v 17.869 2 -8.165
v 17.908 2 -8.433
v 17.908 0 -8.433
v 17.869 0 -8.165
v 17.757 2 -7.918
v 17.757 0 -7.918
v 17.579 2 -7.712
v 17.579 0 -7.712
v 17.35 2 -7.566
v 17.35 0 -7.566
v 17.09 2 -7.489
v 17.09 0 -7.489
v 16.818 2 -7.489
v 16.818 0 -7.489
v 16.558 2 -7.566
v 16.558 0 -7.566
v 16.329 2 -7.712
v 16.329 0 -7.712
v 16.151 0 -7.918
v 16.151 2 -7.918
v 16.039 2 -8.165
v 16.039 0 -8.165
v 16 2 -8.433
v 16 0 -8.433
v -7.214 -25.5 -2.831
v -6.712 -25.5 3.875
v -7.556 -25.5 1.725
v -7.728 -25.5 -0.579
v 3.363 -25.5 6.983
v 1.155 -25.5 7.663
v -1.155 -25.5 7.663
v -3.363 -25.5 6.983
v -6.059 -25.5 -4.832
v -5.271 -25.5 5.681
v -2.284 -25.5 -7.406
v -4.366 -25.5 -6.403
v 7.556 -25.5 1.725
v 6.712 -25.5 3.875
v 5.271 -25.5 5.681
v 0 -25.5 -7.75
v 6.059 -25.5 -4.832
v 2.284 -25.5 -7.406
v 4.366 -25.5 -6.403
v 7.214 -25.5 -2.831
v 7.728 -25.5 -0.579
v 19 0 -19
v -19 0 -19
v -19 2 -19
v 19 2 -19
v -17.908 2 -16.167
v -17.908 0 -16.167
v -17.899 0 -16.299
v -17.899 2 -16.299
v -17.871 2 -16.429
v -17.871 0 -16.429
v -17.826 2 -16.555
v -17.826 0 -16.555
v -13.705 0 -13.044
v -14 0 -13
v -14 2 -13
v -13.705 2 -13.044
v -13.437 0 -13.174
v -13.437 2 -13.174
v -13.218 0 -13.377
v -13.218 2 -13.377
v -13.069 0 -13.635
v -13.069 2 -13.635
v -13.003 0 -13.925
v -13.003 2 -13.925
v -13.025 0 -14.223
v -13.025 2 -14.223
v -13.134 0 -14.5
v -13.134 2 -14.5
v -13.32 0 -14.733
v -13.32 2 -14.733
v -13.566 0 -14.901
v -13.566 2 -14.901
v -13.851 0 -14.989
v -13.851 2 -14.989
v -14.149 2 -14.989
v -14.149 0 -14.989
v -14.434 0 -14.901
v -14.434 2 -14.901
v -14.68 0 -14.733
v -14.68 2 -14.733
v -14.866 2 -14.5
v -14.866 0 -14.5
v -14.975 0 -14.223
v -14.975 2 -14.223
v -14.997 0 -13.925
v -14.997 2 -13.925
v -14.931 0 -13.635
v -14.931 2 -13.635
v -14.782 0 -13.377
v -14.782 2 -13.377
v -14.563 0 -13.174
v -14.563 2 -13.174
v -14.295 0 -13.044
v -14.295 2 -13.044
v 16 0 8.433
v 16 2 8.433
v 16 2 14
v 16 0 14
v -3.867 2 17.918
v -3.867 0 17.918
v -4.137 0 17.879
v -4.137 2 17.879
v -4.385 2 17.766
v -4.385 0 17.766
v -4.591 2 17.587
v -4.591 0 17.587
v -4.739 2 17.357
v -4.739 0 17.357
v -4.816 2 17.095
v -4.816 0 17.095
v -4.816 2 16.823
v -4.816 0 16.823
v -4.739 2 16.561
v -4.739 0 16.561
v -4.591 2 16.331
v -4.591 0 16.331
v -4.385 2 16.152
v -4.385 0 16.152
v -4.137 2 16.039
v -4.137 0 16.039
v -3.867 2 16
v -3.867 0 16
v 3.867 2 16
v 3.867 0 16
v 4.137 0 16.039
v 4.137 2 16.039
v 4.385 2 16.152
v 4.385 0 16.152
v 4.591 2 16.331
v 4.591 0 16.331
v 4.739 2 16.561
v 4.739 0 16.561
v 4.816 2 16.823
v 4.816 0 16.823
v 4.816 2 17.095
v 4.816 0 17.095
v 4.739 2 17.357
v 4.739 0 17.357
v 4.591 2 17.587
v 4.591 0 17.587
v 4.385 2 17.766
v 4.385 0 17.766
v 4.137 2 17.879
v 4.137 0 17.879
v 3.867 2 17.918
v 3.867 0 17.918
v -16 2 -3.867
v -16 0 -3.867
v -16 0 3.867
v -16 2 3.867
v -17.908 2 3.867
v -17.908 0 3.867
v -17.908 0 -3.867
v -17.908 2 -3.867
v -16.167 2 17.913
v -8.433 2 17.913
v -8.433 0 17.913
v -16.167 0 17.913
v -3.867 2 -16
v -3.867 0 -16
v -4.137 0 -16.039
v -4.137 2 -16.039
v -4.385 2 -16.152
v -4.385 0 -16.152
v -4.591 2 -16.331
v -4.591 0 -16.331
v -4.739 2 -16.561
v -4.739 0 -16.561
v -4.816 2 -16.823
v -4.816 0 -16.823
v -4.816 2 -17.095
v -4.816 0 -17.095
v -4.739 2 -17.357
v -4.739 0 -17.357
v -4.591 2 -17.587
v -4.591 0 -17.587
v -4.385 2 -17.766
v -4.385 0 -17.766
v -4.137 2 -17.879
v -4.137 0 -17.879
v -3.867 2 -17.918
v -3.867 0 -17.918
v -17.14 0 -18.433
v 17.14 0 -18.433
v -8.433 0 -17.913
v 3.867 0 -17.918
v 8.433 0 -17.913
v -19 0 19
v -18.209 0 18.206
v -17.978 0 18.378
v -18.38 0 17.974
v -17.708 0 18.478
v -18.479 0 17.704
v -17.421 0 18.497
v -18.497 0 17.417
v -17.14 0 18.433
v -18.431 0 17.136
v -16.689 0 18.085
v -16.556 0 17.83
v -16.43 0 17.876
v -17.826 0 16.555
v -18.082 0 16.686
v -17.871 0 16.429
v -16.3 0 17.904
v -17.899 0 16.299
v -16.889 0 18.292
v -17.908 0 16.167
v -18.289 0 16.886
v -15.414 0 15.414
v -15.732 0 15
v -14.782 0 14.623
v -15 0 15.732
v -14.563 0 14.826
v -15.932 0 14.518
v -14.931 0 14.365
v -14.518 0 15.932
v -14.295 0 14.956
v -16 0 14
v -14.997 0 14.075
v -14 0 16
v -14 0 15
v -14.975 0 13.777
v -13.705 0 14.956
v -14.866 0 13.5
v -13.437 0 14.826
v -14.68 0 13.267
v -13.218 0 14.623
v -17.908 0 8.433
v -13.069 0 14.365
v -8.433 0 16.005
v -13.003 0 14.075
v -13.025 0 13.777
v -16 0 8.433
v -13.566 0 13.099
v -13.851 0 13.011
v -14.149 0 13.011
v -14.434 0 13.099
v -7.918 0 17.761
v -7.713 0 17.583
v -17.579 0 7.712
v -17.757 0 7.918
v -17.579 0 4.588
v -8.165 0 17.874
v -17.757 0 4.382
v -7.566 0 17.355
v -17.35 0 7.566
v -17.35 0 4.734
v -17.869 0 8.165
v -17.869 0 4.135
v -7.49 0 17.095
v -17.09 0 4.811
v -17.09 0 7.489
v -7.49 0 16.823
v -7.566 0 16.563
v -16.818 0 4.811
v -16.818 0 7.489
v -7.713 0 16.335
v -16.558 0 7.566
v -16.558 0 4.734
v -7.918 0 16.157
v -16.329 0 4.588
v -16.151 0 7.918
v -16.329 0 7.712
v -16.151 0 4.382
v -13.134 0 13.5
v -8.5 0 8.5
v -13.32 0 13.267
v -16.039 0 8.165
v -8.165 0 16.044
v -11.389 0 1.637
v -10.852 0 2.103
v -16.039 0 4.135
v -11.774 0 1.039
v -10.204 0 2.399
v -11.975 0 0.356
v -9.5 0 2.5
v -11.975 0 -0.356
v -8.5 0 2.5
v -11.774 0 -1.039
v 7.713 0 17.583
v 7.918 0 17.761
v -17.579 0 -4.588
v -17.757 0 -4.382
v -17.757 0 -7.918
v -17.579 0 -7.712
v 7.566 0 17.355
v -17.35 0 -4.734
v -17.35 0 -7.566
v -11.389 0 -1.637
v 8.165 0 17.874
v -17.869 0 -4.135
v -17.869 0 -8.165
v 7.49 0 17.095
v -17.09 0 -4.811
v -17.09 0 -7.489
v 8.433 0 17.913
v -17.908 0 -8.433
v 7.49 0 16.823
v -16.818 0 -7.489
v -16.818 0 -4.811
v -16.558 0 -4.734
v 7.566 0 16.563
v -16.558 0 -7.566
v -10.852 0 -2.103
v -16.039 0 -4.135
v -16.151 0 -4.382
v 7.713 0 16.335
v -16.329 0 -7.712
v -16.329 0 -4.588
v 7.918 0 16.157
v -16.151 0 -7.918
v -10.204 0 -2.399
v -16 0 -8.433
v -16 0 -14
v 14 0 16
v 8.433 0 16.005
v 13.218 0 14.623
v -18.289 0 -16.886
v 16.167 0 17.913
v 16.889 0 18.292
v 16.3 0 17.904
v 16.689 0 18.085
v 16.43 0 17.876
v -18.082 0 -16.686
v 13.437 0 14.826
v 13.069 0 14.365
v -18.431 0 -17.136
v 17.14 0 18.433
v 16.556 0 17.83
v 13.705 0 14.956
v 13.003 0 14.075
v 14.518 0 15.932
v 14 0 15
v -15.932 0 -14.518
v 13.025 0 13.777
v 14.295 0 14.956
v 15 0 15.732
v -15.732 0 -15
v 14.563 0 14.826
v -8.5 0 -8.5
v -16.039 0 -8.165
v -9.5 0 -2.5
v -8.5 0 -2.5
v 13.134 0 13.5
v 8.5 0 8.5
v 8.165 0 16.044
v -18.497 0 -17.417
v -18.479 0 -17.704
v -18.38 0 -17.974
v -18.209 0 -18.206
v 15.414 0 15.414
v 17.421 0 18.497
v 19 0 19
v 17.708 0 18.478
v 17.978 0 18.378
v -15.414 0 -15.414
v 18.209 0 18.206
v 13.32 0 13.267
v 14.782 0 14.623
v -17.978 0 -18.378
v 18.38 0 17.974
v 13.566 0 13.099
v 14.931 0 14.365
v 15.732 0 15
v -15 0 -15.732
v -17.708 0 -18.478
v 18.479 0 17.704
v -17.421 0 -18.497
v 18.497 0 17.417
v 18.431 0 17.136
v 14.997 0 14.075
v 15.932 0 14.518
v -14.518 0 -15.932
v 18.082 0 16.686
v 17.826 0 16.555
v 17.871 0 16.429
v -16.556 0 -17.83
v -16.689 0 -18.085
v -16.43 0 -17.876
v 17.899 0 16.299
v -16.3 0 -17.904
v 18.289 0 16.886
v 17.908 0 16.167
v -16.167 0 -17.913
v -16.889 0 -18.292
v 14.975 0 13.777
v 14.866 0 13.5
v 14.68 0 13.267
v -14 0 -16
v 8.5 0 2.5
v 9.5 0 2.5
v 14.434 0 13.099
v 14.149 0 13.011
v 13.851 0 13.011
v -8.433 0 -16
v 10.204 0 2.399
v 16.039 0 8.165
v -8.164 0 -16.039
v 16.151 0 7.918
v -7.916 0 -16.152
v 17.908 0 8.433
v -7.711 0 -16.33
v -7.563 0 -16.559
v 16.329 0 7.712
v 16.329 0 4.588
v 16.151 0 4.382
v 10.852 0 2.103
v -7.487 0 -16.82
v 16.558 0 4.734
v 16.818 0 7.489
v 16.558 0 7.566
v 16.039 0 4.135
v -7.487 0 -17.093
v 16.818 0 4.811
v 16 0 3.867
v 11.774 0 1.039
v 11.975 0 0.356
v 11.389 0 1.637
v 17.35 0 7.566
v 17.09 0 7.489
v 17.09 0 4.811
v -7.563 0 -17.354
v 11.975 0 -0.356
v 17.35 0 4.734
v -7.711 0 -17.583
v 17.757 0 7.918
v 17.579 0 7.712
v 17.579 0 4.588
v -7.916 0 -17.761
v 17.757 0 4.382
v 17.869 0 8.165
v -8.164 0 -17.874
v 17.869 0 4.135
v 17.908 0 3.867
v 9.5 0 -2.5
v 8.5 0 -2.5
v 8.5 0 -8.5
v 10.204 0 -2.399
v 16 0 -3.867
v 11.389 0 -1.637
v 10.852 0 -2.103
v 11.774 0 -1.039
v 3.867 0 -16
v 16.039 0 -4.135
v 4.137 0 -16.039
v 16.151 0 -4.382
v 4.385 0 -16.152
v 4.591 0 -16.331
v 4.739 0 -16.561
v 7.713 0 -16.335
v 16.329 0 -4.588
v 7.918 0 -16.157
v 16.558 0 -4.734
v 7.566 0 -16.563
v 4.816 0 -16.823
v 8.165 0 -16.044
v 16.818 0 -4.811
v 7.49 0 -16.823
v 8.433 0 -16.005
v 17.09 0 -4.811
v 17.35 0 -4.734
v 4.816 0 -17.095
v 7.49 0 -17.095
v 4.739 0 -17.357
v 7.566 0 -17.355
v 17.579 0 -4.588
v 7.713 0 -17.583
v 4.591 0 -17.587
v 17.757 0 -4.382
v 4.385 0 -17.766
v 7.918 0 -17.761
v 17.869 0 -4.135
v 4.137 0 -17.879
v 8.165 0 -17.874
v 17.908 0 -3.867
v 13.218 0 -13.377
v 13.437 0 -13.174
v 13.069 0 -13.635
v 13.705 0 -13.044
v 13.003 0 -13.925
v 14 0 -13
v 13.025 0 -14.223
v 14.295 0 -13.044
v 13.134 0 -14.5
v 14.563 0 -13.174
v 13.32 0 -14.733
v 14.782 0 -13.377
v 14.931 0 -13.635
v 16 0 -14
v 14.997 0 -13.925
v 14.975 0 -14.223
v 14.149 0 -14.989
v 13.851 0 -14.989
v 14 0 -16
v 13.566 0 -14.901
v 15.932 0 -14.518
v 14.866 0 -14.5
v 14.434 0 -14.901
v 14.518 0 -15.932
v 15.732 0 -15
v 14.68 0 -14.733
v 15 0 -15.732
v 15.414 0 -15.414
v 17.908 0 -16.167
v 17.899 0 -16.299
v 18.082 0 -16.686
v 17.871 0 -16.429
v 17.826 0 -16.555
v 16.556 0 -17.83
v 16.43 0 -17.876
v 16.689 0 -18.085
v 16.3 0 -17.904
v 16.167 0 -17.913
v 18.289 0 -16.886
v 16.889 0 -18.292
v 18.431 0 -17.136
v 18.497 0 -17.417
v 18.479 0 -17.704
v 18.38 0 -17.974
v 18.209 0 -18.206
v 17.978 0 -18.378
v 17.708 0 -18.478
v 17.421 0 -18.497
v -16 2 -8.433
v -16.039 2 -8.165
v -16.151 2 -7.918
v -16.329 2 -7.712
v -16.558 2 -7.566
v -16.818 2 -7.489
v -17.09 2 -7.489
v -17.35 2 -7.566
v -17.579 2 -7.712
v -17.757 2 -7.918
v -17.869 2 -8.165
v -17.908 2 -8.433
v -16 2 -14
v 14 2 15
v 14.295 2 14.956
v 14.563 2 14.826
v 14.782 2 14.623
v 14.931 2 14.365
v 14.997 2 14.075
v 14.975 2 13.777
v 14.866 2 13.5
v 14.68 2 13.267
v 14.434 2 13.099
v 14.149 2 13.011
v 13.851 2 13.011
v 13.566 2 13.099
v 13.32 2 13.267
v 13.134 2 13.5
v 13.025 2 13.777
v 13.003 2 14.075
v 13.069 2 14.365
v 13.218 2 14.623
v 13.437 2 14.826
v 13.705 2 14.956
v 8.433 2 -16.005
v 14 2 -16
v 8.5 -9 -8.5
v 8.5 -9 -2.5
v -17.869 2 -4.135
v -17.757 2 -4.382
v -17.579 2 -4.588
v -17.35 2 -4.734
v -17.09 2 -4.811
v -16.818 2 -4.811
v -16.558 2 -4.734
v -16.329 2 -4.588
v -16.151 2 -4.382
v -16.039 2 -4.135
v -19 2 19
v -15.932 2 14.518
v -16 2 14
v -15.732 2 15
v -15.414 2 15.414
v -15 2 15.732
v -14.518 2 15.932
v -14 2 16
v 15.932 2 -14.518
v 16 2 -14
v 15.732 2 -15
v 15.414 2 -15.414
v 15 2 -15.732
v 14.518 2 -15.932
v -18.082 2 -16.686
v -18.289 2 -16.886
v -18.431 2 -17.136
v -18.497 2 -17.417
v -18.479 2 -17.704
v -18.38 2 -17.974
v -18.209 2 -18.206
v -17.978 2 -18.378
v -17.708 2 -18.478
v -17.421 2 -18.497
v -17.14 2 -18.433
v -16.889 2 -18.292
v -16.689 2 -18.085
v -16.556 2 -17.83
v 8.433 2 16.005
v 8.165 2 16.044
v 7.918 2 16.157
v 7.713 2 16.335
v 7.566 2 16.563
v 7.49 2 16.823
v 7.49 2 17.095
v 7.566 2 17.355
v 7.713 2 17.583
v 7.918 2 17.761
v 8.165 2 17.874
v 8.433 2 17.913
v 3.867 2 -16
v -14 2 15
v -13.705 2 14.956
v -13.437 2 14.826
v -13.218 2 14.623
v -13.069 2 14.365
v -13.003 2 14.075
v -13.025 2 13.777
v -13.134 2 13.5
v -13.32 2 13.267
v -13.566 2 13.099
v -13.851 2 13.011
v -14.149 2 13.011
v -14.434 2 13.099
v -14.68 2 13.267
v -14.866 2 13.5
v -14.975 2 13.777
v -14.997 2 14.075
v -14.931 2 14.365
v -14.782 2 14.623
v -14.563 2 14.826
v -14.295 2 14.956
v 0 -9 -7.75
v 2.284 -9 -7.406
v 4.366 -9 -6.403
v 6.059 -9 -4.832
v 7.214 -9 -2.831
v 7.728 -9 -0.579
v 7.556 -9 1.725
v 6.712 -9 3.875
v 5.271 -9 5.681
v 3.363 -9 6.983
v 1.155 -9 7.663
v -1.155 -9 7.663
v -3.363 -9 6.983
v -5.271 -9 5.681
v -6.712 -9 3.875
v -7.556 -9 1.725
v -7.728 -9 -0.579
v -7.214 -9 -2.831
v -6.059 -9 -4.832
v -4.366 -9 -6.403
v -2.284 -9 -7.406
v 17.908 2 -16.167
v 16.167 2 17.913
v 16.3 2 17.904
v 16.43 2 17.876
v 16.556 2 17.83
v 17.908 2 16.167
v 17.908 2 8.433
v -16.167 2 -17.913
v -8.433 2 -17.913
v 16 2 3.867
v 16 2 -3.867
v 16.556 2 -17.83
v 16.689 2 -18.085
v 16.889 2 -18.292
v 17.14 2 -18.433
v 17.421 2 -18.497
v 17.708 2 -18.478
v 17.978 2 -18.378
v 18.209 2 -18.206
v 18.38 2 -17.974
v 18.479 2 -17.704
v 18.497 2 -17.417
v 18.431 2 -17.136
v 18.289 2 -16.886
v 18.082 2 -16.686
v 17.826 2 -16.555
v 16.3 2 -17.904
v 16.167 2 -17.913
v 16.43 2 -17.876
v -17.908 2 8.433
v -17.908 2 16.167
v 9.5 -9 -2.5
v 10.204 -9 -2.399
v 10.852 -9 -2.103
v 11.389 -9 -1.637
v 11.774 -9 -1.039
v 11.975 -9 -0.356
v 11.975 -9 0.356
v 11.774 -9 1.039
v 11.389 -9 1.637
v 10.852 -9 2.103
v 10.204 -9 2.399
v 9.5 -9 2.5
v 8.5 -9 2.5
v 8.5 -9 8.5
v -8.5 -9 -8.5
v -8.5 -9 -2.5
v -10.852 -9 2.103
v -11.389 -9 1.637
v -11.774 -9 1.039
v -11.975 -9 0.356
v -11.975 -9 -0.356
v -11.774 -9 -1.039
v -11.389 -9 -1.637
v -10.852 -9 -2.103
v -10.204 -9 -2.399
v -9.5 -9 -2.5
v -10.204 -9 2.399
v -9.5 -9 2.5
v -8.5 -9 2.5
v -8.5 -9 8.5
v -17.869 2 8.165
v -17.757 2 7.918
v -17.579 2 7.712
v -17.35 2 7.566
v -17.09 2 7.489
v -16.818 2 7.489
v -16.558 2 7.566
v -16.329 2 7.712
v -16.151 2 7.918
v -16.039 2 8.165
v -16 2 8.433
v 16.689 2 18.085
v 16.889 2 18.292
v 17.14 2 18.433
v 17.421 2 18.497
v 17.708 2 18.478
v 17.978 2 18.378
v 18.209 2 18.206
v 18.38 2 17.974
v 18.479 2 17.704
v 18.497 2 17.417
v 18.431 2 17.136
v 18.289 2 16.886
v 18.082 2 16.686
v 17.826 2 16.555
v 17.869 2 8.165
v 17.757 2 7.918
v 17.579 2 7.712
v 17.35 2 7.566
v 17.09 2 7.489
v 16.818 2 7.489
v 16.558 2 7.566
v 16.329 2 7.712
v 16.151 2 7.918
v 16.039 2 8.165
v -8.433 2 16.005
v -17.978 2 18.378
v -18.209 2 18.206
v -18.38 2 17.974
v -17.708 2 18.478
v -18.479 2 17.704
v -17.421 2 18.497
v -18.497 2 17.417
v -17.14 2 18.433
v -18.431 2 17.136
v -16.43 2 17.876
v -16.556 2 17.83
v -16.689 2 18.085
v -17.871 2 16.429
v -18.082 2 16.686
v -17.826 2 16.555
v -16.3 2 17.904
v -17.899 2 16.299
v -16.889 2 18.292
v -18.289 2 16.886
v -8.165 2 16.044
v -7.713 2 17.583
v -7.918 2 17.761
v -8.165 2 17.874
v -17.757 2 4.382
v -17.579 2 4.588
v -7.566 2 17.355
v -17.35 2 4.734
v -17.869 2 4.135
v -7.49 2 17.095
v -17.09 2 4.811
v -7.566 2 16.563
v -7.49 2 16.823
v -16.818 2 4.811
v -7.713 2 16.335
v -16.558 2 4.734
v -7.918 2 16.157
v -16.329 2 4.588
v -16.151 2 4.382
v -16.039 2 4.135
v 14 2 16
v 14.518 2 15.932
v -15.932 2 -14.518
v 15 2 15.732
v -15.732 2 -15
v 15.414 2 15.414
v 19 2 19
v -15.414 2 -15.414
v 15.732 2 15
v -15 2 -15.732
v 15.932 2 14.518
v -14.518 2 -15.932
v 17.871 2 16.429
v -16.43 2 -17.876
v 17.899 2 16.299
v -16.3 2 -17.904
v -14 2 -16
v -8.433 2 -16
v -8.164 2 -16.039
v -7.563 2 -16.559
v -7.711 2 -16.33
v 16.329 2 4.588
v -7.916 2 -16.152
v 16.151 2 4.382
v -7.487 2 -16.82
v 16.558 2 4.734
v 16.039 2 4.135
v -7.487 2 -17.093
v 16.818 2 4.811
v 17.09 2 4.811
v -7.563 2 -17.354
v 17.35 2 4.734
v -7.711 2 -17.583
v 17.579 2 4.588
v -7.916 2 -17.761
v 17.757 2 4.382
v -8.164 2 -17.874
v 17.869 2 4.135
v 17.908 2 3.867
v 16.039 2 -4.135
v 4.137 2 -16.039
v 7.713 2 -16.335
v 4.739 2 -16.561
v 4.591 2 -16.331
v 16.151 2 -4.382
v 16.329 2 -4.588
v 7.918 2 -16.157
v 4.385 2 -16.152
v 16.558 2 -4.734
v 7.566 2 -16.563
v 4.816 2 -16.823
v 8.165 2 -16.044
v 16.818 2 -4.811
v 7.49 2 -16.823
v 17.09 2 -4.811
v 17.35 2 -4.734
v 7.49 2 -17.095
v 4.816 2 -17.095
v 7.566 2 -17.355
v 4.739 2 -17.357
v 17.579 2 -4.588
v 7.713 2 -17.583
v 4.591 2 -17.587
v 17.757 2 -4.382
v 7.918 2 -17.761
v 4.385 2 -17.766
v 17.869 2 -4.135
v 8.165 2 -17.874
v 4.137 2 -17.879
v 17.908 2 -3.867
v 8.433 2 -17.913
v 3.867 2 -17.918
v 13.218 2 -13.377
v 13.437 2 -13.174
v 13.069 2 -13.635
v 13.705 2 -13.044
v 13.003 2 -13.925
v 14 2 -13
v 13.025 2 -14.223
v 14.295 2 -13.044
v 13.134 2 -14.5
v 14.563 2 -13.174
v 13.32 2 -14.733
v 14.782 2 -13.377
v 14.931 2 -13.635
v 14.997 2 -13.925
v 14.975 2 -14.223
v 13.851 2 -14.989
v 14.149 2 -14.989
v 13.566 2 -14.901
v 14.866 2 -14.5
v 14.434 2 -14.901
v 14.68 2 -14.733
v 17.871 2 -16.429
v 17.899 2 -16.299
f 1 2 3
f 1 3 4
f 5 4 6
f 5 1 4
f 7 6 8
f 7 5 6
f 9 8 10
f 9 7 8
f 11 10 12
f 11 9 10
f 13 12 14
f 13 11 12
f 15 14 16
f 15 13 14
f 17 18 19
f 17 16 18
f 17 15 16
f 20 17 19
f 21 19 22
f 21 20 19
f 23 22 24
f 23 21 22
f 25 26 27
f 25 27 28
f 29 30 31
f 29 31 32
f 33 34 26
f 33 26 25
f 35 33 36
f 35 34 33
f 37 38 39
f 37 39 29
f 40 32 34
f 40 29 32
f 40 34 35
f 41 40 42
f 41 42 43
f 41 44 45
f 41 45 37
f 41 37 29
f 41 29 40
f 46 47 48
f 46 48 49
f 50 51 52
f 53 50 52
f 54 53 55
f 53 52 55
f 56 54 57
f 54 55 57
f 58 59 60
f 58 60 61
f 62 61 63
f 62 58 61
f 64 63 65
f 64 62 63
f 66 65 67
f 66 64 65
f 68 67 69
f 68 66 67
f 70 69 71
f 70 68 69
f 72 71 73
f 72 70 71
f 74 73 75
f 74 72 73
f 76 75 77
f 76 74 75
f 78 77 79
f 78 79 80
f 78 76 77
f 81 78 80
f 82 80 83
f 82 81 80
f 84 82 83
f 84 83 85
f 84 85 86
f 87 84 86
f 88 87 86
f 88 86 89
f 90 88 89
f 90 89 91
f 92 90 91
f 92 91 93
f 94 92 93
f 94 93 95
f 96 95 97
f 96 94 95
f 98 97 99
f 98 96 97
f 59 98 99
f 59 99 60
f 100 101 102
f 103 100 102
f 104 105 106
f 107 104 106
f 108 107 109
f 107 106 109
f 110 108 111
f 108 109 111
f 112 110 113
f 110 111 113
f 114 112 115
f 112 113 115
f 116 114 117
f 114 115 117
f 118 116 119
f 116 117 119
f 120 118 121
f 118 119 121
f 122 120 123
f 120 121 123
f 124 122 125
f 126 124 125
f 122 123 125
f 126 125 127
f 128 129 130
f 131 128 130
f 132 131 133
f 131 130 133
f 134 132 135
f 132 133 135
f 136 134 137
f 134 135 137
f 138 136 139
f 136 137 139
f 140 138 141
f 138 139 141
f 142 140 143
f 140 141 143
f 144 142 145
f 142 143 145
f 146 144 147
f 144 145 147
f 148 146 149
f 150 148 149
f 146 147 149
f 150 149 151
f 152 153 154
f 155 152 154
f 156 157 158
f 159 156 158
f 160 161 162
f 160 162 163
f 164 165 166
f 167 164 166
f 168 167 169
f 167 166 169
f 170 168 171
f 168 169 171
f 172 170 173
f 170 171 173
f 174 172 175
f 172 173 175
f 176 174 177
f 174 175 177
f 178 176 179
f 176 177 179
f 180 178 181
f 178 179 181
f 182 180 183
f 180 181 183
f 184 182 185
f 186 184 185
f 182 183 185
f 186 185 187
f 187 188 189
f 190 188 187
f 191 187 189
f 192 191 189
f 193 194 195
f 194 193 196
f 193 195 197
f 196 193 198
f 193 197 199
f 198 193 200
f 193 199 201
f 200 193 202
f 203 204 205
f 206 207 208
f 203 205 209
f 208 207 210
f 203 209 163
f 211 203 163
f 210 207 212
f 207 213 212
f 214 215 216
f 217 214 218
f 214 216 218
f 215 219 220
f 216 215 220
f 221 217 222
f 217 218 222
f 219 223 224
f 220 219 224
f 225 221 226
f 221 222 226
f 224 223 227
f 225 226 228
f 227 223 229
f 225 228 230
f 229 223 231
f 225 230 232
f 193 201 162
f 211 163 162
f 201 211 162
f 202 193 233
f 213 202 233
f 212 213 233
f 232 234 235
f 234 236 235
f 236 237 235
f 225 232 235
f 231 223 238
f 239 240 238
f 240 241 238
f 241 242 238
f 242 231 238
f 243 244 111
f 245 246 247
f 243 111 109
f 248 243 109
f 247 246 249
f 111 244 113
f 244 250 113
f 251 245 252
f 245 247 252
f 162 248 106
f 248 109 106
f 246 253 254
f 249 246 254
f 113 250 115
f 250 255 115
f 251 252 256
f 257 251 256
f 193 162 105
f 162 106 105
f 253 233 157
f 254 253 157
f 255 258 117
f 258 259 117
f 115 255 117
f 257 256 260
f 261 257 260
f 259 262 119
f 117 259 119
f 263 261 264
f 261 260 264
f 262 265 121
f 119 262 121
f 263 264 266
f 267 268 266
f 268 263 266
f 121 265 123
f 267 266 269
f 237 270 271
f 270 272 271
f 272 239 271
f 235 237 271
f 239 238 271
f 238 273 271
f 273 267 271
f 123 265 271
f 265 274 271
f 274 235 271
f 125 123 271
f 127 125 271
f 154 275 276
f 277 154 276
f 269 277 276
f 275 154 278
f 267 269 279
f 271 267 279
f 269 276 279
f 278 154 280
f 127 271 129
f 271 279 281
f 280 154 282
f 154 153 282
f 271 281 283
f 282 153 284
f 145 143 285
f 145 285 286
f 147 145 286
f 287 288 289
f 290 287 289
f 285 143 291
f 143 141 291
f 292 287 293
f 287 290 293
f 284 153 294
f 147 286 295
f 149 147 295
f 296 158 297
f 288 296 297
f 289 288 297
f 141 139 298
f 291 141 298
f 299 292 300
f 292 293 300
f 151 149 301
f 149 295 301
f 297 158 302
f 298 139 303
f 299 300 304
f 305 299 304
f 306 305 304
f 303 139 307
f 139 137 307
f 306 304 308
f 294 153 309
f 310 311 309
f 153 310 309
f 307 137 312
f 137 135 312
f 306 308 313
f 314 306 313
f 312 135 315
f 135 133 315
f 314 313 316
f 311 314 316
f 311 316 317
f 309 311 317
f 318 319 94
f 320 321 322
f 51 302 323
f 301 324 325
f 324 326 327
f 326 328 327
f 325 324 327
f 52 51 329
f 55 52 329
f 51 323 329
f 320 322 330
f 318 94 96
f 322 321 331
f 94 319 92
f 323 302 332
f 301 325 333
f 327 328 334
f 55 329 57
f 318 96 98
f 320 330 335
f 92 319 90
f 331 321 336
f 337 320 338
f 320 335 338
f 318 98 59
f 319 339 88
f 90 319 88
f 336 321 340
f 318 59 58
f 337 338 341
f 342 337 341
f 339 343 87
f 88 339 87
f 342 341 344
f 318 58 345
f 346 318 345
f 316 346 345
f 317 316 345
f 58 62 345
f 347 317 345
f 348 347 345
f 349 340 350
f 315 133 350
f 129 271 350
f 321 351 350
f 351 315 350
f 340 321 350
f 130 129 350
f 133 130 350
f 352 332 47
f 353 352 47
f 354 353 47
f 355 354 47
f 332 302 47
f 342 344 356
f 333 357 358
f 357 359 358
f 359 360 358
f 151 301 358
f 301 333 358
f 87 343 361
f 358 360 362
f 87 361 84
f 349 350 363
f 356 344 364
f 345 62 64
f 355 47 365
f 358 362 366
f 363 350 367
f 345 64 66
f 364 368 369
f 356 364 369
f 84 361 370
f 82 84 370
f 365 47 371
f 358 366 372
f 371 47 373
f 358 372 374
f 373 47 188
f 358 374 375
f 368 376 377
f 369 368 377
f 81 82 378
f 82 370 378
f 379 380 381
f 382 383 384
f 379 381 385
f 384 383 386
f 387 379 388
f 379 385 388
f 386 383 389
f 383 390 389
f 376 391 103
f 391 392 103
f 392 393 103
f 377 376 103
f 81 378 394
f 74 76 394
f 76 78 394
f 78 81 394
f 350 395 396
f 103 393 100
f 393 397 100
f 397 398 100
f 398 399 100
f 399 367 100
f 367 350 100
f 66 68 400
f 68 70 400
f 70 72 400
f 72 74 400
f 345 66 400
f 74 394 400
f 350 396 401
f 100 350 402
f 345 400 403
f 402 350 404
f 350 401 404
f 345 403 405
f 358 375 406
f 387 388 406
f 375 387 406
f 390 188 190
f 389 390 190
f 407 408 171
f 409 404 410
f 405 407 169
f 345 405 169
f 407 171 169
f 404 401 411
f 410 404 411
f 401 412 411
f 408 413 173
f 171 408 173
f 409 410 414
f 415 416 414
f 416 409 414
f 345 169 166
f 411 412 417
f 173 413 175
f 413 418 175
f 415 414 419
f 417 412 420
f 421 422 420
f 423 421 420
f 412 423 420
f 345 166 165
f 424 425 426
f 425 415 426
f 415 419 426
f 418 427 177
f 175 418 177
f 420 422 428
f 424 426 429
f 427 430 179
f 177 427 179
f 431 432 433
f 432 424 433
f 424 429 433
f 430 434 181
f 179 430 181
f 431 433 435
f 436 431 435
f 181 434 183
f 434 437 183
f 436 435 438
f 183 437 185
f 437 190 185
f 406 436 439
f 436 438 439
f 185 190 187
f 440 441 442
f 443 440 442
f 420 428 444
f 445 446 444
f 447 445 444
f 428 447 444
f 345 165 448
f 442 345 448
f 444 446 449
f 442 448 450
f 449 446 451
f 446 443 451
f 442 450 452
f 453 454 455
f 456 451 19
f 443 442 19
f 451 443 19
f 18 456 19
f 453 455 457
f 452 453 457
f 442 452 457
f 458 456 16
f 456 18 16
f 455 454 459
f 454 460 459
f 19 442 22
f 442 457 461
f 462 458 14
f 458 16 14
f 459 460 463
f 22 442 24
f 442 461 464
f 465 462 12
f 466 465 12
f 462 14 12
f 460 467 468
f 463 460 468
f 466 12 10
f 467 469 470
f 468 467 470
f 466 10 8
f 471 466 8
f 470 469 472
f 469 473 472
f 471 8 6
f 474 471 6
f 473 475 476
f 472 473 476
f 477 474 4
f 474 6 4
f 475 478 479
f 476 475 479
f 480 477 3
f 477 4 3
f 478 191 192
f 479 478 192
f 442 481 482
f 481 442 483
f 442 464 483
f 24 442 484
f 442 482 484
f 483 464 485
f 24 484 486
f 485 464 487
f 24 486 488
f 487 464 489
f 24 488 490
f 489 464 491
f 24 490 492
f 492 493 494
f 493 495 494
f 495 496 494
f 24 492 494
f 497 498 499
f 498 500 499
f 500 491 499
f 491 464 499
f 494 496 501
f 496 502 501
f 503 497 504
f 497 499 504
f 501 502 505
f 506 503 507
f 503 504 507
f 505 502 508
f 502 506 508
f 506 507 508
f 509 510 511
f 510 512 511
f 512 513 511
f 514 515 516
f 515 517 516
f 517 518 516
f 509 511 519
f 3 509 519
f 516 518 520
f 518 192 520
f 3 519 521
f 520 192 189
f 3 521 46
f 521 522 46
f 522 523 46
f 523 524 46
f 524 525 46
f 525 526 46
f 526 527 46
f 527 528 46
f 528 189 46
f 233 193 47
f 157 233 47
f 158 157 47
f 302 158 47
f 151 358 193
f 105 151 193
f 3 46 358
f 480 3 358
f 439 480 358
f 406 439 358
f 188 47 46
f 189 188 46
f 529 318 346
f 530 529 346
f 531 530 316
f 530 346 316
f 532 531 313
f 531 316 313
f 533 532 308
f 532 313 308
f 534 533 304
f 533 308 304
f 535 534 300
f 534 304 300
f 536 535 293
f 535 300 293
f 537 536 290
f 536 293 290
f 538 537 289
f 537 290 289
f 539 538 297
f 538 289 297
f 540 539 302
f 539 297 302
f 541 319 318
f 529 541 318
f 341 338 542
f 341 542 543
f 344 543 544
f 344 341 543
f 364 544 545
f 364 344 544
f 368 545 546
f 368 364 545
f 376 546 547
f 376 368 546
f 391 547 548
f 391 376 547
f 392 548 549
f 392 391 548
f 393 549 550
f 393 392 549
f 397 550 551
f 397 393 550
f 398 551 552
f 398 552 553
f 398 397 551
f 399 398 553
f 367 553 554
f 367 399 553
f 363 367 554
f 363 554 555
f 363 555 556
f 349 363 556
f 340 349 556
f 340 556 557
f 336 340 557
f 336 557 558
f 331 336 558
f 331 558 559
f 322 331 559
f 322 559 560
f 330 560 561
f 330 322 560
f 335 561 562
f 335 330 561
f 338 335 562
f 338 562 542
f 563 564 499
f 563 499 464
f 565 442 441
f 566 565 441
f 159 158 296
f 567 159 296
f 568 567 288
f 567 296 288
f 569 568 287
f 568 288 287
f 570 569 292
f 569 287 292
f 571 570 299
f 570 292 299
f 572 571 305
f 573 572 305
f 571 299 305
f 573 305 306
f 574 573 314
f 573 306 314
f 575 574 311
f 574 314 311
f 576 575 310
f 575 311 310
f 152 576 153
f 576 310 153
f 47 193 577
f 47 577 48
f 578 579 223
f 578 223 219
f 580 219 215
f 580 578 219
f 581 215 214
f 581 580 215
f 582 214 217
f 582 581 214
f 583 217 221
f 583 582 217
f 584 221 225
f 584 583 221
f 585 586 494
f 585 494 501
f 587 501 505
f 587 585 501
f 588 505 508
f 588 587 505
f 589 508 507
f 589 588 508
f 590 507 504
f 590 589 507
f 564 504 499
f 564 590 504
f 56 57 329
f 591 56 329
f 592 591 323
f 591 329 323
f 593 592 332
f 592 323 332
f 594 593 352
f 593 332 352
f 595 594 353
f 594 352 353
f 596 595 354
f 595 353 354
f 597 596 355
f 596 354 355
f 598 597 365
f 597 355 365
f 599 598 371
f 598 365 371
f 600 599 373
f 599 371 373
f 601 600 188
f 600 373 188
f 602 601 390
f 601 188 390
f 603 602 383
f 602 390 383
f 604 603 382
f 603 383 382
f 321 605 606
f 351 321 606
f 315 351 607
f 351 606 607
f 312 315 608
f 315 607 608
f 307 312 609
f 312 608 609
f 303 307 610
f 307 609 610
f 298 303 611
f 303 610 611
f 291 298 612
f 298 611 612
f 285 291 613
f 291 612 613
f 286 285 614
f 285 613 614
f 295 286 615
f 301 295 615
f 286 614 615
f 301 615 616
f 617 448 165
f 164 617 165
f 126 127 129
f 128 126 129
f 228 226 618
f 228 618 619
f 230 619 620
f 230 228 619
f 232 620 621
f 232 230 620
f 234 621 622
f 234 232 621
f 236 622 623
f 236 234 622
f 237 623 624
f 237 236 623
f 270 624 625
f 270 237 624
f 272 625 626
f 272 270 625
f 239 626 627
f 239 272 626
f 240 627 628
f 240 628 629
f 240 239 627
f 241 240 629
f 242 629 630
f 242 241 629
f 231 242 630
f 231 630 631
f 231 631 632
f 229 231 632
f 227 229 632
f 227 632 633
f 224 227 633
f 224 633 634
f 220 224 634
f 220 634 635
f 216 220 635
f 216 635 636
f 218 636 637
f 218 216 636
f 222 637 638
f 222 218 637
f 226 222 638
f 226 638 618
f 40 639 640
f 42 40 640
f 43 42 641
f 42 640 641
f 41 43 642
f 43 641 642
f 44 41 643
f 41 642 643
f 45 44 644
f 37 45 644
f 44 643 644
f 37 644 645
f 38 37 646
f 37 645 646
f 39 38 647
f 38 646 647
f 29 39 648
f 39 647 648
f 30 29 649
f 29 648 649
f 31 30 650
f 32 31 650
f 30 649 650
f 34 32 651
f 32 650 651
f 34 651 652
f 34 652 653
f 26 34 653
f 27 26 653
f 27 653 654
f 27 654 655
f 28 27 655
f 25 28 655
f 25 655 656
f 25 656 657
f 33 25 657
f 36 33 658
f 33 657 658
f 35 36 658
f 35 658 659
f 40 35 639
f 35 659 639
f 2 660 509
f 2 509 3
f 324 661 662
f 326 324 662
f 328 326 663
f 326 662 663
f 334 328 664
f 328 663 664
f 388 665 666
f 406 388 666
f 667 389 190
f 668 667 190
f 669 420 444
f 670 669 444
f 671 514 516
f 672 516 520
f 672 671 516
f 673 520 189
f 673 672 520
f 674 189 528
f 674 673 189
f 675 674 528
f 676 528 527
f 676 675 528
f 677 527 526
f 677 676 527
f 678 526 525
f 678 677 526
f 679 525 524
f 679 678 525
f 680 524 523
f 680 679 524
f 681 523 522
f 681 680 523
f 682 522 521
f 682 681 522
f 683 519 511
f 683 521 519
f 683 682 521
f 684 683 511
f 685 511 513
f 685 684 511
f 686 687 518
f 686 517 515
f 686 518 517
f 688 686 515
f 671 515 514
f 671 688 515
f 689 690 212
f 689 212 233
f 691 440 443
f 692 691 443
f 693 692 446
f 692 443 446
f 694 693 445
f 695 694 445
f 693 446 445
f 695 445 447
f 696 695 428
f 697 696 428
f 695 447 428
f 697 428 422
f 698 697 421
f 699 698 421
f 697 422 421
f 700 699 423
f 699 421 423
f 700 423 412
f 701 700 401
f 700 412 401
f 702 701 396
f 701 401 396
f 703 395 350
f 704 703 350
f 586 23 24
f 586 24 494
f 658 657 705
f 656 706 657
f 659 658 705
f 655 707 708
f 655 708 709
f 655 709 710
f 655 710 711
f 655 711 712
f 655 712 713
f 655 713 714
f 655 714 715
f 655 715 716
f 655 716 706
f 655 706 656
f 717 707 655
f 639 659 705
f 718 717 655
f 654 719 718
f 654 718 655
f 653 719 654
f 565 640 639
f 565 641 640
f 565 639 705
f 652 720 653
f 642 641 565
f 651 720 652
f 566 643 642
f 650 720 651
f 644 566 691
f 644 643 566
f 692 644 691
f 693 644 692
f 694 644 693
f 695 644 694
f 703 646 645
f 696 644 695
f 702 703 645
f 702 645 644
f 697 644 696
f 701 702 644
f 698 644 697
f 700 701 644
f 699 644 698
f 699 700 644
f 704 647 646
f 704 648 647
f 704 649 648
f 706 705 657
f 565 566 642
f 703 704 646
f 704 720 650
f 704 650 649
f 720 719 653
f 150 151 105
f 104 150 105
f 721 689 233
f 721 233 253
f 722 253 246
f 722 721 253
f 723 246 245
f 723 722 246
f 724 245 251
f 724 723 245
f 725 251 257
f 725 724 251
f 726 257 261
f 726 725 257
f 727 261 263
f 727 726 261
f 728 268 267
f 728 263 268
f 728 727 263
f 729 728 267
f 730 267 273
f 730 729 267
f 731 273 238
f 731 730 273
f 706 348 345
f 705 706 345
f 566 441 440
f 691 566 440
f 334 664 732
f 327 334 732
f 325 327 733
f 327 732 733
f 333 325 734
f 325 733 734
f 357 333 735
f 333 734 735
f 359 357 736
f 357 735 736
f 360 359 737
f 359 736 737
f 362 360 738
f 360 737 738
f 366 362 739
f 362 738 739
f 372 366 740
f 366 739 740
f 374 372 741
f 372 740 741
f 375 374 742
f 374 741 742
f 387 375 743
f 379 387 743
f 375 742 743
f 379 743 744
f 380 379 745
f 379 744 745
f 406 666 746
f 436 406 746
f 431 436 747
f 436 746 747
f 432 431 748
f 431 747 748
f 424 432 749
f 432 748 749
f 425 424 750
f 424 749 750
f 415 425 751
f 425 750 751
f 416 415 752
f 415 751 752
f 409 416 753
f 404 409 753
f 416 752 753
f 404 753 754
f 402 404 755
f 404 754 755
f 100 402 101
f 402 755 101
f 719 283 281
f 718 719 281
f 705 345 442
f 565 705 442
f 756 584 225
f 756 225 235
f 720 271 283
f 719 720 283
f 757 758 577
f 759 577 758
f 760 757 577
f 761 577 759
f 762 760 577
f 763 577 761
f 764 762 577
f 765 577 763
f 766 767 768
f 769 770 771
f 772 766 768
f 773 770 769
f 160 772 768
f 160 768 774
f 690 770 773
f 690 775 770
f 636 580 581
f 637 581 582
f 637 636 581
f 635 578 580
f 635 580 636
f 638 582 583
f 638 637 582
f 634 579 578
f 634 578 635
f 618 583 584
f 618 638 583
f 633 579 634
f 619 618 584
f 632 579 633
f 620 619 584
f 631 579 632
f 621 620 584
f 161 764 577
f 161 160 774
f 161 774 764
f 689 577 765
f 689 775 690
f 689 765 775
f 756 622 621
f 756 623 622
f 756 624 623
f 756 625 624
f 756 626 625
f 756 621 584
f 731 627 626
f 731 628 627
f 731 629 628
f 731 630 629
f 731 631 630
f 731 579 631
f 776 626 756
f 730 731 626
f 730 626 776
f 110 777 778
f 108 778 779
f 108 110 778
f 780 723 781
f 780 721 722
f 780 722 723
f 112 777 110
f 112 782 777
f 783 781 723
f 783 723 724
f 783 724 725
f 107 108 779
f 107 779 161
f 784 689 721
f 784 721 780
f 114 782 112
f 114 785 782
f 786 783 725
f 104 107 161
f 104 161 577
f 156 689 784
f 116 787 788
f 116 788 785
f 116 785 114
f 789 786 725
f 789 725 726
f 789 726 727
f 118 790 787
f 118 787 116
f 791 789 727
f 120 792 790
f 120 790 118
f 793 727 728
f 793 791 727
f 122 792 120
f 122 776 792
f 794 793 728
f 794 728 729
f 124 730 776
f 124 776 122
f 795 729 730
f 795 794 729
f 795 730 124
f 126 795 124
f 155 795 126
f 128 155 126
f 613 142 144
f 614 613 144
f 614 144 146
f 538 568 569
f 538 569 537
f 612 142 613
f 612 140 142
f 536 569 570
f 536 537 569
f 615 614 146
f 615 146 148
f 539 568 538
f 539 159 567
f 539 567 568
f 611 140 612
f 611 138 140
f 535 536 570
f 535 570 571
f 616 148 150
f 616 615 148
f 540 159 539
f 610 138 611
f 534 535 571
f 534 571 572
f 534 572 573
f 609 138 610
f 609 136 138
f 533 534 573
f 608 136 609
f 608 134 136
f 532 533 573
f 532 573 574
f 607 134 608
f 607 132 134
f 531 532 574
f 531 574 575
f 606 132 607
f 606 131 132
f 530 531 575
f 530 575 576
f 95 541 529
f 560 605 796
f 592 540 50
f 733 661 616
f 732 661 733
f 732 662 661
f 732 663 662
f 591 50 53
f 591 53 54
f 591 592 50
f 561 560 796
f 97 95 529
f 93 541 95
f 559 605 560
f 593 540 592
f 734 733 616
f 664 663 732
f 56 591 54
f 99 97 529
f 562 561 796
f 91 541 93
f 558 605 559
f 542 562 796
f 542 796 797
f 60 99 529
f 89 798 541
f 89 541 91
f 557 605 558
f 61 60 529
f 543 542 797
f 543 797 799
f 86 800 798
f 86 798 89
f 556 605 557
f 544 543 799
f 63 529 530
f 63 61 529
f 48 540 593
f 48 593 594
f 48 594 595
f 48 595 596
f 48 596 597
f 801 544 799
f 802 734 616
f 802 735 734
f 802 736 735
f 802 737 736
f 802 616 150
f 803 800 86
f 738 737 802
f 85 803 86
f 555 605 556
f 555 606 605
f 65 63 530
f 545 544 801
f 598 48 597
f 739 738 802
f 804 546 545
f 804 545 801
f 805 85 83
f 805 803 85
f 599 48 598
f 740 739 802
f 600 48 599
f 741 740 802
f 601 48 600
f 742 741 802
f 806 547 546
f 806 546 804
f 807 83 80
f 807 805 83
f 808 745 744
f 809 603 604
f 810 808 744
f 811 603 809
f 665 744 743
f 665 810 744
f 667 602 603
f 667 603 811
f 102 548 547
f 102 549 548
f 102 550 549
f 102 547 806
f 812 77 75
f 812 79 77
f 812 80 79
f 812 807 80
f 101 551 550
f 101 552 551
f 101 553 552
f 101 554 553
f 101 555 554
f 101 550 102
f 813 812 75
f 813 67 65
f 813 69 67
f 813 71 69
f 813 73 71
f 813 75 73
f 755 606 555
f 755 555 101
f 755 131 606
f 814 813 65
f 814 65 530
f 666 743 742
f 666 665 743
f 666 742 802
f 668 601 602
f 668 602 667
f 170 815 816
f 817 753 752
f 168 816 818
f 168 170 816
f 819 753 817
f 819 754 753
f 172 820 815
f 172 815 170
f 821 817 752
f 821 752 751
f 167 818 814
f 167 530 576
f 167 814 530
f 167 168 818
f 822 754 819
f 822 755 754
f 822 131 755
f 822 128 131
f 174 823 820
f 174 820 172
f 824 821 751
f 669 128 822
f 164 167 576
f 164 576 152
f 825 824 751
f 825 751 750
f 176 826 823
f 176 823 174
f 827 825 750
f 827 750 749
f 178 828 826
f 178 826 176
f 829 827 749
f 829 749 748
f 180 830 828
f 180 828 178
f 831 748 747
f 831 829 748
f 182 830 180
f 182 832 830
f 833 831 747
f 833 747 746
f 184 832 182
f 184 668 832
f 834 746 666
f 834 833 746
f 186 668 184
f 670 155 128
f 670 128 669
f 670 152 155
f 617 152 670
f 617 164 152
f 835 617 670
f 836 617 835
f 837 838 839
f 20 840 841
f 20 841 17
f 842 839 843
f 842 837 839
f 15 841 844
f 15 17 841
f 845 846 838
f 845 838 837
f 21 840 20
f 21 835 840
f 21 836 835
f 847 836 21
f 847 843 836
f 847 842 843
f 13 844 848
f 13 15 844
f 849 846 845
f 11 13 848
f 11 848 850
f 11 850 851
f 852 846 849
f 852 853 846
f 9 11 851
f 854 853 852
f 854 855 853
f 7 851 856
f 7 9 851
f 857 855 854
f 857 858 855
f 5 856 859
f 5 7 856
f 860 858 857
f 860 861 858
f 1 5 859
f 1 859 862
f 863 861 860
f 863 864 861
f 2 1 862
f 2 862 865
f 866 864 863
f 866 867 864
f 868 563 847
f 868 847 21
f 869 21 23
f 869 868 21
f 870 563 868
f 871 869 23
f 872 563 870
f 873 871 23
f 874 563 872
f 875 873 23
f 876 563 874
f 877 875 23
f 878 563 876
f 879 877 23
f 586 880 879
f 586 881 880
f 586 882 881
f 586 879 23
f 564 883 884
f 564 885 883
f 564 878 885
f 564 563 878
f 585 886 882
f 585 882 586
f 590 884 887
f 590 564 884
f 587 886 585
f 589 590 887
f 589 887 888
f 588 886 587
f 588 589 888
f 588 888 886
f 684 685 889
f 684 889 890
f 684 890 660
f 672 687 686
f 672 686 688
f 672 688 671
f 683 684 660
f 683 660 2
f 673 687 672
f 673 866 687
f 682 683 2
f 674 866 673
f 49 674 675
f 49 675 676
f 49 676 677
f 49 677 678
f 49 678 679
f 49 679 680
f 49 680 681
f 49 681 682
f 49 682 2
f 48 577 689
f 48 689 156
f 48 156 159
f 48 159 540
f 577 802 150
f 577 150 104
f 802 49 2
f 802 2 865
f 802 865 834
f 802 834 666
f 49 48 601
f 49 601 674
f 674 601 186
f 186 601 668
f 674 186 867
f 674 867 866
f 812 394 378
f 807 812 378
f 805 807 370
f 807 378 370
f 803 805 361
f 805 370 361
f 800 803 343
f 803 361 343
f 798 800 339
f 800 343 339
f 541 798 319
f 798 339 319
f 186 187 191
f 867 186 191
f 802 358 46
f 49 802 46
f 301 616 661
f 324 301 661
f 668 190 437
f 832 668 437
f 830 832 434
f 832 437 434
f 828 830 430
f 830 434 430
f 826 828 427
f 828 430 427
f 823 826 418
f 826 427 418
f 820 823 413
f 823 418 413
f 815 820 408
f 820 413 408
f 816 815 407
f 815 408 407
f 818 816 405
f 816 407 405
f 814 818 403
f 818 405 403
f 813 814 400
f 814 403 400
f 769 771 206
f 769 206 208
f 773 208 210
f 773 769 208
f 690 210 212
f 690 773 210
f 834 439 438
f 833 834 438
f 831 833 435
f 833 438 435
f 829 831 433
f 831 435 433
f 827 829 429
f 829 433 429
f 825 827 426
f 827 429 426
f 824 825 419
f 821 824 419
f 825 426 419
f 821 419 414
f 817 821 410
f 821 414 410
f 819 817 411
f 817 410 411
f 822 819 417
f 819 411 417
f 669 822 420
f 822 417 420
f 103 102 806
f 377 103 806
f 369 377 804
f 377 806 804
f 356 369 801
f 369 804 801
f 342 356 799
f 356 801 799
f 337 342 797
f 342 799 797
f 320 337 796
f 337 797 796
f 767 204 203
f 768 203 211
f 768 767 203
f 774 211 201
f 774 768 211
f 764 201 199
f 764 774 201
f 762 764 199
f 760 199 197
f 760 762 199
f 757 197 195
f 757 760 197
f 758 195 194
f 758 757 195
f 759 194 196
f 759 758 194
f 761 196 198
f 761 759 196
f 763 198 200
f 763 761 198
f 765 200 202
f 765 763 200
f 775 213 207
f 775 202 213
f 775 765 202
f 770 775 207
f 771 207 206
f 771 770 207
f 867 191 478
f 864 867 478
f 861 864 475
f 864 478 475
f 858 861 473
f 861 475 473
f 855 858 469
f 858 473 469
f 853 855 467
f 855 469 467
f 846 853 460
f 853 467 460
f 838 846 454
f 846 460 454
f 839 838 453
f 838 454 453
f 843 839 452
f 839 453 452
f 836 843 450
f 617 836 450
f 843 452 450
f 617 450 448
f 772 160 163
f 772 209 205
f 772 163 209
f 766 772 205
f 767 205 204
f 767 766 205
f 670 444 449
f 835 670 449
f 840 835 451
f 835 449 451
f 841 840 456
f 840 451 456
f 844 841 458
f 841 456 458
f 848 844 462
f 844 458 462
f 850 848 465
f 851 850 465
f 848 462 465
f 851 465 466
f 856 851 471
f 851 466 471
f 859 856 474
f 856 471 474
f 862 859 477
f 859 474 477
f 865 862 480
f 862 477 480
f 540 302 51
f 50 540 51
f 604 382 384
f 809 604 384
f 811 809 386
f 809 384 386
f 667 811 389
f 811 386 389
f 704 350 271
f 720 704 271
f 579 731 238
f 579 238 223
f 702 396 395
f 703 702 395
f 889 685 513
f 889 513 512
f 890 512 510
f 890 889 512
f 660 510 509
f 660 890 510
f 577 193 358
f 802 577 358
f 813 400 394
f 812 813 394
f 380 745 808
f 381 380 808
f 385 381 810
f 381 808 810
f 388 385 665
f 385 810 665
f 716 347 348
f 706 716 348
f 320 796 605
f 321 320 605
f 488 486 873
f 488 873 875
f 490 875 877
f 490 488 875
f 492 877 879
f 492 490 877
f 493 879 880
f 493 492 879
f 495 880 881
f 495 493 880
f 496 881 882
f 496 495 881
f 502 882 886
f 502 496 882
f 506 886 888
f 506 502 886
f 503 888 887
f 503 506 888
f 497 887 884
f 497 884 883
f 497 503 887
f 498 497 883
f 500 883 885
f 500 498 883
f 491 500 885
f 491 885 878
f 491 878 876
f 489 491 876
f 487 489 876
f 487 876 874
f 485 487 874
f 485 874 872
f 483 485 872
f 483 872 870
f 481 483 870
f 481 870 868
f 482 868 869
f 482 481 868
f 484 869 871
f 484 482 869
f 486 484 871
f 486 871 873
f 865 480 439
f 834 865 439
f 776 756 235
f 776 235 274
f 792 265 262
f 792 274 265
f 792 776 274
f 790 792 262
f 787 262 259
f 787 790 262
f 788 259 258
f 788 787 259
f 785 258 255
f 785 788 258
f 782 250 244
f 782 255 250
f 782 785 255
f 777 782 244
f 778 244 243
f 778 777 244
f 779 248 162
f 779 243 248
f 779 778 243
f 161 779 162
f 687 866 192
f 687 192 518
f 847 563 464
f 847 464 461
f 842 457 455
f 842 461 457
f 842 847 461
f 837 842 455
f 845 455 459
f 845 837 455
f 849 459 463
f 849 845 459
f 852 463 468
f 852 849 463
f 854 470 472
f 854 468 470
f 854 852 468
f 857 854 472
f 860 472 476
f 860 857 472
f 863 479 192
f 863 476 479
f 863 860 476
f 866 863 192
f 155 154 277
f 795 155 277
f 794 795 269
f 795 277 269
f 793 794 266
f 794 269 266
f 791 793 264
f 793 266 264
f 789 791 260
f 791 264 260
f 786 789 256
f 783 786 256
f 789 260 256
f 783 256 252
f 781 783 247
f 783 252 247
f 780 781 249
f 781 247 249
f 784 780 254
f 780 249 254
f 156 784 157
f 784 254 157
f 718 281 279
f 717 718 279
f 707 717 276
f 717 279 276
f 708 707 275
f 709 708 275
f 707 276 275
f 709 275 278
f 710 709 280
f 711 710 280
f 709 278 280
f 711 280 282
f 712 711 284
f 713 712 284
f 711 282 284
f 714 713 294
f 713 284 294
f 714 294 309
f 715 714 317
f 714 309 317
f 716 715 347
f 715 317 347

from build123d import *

# Parameters (mm, degrees)
SKETCH_1_W          = 38
SKETCH_1_H          = 38
SKETCH_1_R          = 1
EXTRUDE_1_DEPTH     = 2
CUT_EXTRUDE_1_DEPTH = 27.944387171
EXTRUDE_2_DEPTH     = 9
SKETCH_4_R          = 7.75
EXTRUDE_3_DEPTH     = 16.5


with BuildPart() as part:
    # 草图1 → 凸台-拉伸1 (new body)
    with BuildSketch(Plane(origin=(0, 0, 0), x_dir=(1, 0, 0), z_dir=(0, 1, 0))):
        Rectangle(SKETCH_1_W, SKETCH_1_H)
        with BuildLine():
            ThreePointArc((-8.433484656, 17.913076839), (-7.476946236, 16.95653842), (-8.433484656, 16))
            Line((-8.433484656, 16), (-14, 16))
            ThreePointArc((-14, 16), (-15.414213562, 15.414213562), (-16, 14))
            Line((-16, 14), (-16, 8.433484656))
            ThreePointArc((-16, 8.433484656), (-16.954069804, 7.479414851), (-17.908139609, 8.433484656))
            Line((-17.908139609, 8.433484656), (-17.908139609, 16.166515344))
            ThreePointArc((-17.908139609, 16.166515344), (-17.887296699, 16.3648503), (-17.825678652, 16.554519479))
            ThreePointArc((-17.825678652, 16.554519479), (-18.208704938, 18.205505004), (-16.55600298, 17.829953976))
            ThreePointArc((-16.55600298, 17.829953976), (-16.365644717, 17.892064742), (-16.166515344, 17.913076839))
            Line((-16.166515344, 17.913076839), (-8.433484656, 17.913076839))
        make_face(mode=Mode.SUBTRACT)
        with BuildLine():
            ThreePointArc((-17.908139609, 3.866515344), (-16.954069804, 4.820585149), (-16, 3.866515344))
            Line((-16, 3.866515344), (-16, -3.866515344))
            ThreePointArc((-16, -3.866515344), (-16.954069804, -4.820585149), (-17.908139609, -3.866515344))
            Line((-17.908139609, -3.866515344), (-17.908139609, 3.866515344))
        make_face(mode=Mode.SUBTRACT)
        with BuildLine():
            ThreePointArc((-3.866515344, -17.91801407), (-4.825522379, -16.959007035), (-3.866515344, -16))
            Line((-3.866515344, -16), (3.866515344, -16))
            ThreePointArc((3.866515344, -16), (4.825522379, -16.959007035), (3.866515344, -17.91801407))
            Line((3.866515344, -17.91801407), (-3.866515344, -17.91801407))
        make_face(mode=Mode.SUBTRACT)
        with BuildLine():
            ThreePointArc((17.908139609, -3.866515344), (16.954069804, -4.820585149), (16, -3.866515344))
            Line((16, -3.866515344), (16, 3.866515344))
            ThreePointArc((16, 3.866515344), (16.954069804, 4.820585149), (17.908139609, 3.866515344))
            Line((17.908139609, 3.866515344), (17.908139609, -3.866515344))
        make_face(mode=Mode.SUBTRACT)
        with BuildLine():
            ThreePointArc((3.866515344, 17.91801407), (4.825522379, 16.959007035), (3.866515344, 16))
            Line((3.866515344, 16), (-3.866515344, 16))
            ThreePointArc((-3.866515344, 16), (-4.825522379, 16.959007035), (-3.866515344, 17.91801407))
            Line((-3.866515344, 17.91801407), (3.866515344, 17.91801407))
        make_face(mode=Mode.SUBTRACT)
        with Locations(Location((-14, -14, 0), (0, 0, 270))):
            Circle(SKETCH_1_R, mode=Mode.SUBTRACT)
        with Locations(Location((14, -14, 0), (0, 0, 270))):
            Circle(SKETCH_1_R, mode=Mode.SUBTRACT)
        with Locations(Location((-14, 14, 0), (0, 0, 270))):
            Circle(SKETCH_1_R, mode=Mode.SUBTRACT)
        with Locations(Location((14, 14, 0), (0, 0, 270))):
            Circle(SKETCH_1_R, mode=Mode.SUBTRACT)
    extrude(amount=EXTRUDE_1_DEPTH)

    # 草图2 → 切除-拉伸1 (cut, through all)
    with BuildSketch(Plane(origin=(0, 2, 0), x_dir=(1, 0, 0), z_dir=(0, 1, 0))):
        with BuildLine():
            Line((-17.908139609, -16.166515344), (-17.908139609, -8.433484656))
            ThreePointArc((-17.908139609, -8.433484656), (-16.954069804, -7.479414851), (-16, -8.433484656))
            Line((-16, -8.433484656), (-16, -14))
            ThreePointArc((-16, -14), (-15.414213562, -15.414213562), (-14, -16))
            Line((-14, -16), (-8.433484656, -16.00493723))
            ThreePointArc((-8.433484656, -16.00493723), (-7.48026069, -16.959007035), (-8.433484656, -17.913076839))
            Line((-8.433484656, -17.913076839), (-16.166515344, -17.913076839))
            ThreePointArc((-16.166515344, -17.913076839), (-16.365644717, -17.892064742), (-16.55600298, -17.829953976))
            ThreePointArc((-16.55600298, -17.829953976), (-18.208704938, -18.205505004), (-17.825678652, -16.554519479))
            ThreePointArc((-17.825678652, -16.554519479), (-17.887296699, -16.3648503), (-17.908139609, -16.166515344))
        make_face()
        with BuildLine():
            Line((17.908139609, -16.166515344), (17.908139609, -8.433484656))
            ThreePointArc((17.908139609, -8.433484656), (16.954069804, -7.479414851), (16, -8.433484656))
            Line((16, -8.433484656), (16, -14))
            ThreePointArc((16, -14), (15.414213562, -15.414213562), (14, -16))
            Line((14, -16), (8.433484656, -16.00493723))
            ThreePointArc((8.433484656, -16.00493723), (7.48026069, -16.959007035), (8.433484656, -17.913076839))
            Line((8.433484656, -17.913076839), (16.166515344, -17.913076839))
            ThreePointArc((16.166515344, -17.913076839), (16.365644717, -17.892064742), (16.55600298, -17.829953976))
            ThreePointArc((16.55600298, -17.829953976), (18.208704938, -18.205505004), (17.825678652, -16.554519479))
            ThreePointArc((17.825678652, -16.554519479), (17.887296699, -16.3648503), (17.908139609, -16.166515344))
        make_face()
        with BuildLine():
            Line((8.433484656, 17.913076839), (16.166515344, 17.913076839))
            ThreePointArc((16.166515344, 17.913076839), (16.365644717, 17.892064742), (16.55600298, 17.829953976))
            ThreePointArc((16.55600298, 17.829953976), (18.208704938, 18.205505004), (17.825678652, 16.554519479))
            ThreePointArc((17.825678652, 16.554519479), (17.887296699, 16.3648503), (17.908139609, 16.166515344))
            Line((17.908139609, 16.166515344), (17.908139609, 8.433484656))
            ThreePointArc((17.908139609, 8.433484656), (16.954069804, 7.479414851), (16, 8.433484656))
            Line((16, 8.433484656), (16, 14))
            ThreePointArc((16, 14), (15.414213562, 15.414213562), (14, 16))
            Line((14, 16), (8.433484656, 16.00493723))
            ThreePointArc((8.433484656, 16.00493723), (7.48026069, 16.959007035), (8.433484656, 17.913076839))
        make_face()
        with BuildLine():
            Line((-8.433484656, 17.913076839), (-16.166515344, 17.913076839))
            ThreePointArc((-16.166515344, 17.913076839), (-16.365644717, 17.892064742), (-16.55600298, 17.829953976))
            ThreePointArc((-16.55600298, 17.829953976), (-18.208704938, 18.205505004), (-17.825678652, 16.554519479))
            ThreePointArc((-17.825678652, 16.554519479), (-17.887296699, 16.3648503), (-17.908139609, 16.166515344))
            Line((-17.908139609, 16.166515344), (-17.908139609, 8.433484656))
            ThreePointArc((-17.908139609, 8.433484656), (-16.954069804, 7.479414851), (-16, 8.433484656))
            Line((-16, 8.433484656), (-16, 14))
            ThreePointArc((-16, 14), (-15.414213562, 15.414213562), (-14, 16))
            Line((-14, 16), (-8.433484656, 16.00493723))
            ThreePointArc((-8.433484656, 16.00493723), (-7.48026069, 16.959007035), (-8.433484656, 17.913076839))
        make_face()
    extrude(amount=-CUT_EXTRUDE_1_DEPTH, mode=Mode.SUBTRACT)

    # 草图3 → 凸台-拉伸2 (add)
    with BuildSketch(Plane.XZ):
        with BuildLine():
            Line((-8.5, 2.5), (-9.5, 2.5))
            ThreePointArc((-9.5, 2.5), (-12, 0), (-9.5, -2.5))
            Line((-9.5, -2.5), (-8.5, -2.5))
            Line((-8.5, -2.5), (-8.5, -8.5))
            Line((-8.5, -8.5), (8.5, -8.5))
            Line((8.5, -8.5), (8.5, -2.5))
            Line((8.5, -2.5), (9.5, -2.5))
            ThreePointArc((9.5, -2.5), (12, 0), (9.5, 2.5))
            Line((9.5, 2.5), (8.5, 2.5))
            Line((8.5, 2.5), (8.5, 8.5))
            Line((8.5, 8.5), (-8.5, 8.5))
            Line((-8.5, 8.5), (-8.5, 2.5))
        make_face()
    extrude(amount=EXTRUDE_2_DEPTH)

    # 草图4 → 凸台-拉伸3 (add)
    with BuildSketch(Plane.XZ.offset(9)):
        with Locations(Location((0, 0, 0), (0, 0, 270))):
            Circle(SKETCH_4_R)
    extrude(amount=EXTRUDE_3_DEPTH)


solid = part.part
